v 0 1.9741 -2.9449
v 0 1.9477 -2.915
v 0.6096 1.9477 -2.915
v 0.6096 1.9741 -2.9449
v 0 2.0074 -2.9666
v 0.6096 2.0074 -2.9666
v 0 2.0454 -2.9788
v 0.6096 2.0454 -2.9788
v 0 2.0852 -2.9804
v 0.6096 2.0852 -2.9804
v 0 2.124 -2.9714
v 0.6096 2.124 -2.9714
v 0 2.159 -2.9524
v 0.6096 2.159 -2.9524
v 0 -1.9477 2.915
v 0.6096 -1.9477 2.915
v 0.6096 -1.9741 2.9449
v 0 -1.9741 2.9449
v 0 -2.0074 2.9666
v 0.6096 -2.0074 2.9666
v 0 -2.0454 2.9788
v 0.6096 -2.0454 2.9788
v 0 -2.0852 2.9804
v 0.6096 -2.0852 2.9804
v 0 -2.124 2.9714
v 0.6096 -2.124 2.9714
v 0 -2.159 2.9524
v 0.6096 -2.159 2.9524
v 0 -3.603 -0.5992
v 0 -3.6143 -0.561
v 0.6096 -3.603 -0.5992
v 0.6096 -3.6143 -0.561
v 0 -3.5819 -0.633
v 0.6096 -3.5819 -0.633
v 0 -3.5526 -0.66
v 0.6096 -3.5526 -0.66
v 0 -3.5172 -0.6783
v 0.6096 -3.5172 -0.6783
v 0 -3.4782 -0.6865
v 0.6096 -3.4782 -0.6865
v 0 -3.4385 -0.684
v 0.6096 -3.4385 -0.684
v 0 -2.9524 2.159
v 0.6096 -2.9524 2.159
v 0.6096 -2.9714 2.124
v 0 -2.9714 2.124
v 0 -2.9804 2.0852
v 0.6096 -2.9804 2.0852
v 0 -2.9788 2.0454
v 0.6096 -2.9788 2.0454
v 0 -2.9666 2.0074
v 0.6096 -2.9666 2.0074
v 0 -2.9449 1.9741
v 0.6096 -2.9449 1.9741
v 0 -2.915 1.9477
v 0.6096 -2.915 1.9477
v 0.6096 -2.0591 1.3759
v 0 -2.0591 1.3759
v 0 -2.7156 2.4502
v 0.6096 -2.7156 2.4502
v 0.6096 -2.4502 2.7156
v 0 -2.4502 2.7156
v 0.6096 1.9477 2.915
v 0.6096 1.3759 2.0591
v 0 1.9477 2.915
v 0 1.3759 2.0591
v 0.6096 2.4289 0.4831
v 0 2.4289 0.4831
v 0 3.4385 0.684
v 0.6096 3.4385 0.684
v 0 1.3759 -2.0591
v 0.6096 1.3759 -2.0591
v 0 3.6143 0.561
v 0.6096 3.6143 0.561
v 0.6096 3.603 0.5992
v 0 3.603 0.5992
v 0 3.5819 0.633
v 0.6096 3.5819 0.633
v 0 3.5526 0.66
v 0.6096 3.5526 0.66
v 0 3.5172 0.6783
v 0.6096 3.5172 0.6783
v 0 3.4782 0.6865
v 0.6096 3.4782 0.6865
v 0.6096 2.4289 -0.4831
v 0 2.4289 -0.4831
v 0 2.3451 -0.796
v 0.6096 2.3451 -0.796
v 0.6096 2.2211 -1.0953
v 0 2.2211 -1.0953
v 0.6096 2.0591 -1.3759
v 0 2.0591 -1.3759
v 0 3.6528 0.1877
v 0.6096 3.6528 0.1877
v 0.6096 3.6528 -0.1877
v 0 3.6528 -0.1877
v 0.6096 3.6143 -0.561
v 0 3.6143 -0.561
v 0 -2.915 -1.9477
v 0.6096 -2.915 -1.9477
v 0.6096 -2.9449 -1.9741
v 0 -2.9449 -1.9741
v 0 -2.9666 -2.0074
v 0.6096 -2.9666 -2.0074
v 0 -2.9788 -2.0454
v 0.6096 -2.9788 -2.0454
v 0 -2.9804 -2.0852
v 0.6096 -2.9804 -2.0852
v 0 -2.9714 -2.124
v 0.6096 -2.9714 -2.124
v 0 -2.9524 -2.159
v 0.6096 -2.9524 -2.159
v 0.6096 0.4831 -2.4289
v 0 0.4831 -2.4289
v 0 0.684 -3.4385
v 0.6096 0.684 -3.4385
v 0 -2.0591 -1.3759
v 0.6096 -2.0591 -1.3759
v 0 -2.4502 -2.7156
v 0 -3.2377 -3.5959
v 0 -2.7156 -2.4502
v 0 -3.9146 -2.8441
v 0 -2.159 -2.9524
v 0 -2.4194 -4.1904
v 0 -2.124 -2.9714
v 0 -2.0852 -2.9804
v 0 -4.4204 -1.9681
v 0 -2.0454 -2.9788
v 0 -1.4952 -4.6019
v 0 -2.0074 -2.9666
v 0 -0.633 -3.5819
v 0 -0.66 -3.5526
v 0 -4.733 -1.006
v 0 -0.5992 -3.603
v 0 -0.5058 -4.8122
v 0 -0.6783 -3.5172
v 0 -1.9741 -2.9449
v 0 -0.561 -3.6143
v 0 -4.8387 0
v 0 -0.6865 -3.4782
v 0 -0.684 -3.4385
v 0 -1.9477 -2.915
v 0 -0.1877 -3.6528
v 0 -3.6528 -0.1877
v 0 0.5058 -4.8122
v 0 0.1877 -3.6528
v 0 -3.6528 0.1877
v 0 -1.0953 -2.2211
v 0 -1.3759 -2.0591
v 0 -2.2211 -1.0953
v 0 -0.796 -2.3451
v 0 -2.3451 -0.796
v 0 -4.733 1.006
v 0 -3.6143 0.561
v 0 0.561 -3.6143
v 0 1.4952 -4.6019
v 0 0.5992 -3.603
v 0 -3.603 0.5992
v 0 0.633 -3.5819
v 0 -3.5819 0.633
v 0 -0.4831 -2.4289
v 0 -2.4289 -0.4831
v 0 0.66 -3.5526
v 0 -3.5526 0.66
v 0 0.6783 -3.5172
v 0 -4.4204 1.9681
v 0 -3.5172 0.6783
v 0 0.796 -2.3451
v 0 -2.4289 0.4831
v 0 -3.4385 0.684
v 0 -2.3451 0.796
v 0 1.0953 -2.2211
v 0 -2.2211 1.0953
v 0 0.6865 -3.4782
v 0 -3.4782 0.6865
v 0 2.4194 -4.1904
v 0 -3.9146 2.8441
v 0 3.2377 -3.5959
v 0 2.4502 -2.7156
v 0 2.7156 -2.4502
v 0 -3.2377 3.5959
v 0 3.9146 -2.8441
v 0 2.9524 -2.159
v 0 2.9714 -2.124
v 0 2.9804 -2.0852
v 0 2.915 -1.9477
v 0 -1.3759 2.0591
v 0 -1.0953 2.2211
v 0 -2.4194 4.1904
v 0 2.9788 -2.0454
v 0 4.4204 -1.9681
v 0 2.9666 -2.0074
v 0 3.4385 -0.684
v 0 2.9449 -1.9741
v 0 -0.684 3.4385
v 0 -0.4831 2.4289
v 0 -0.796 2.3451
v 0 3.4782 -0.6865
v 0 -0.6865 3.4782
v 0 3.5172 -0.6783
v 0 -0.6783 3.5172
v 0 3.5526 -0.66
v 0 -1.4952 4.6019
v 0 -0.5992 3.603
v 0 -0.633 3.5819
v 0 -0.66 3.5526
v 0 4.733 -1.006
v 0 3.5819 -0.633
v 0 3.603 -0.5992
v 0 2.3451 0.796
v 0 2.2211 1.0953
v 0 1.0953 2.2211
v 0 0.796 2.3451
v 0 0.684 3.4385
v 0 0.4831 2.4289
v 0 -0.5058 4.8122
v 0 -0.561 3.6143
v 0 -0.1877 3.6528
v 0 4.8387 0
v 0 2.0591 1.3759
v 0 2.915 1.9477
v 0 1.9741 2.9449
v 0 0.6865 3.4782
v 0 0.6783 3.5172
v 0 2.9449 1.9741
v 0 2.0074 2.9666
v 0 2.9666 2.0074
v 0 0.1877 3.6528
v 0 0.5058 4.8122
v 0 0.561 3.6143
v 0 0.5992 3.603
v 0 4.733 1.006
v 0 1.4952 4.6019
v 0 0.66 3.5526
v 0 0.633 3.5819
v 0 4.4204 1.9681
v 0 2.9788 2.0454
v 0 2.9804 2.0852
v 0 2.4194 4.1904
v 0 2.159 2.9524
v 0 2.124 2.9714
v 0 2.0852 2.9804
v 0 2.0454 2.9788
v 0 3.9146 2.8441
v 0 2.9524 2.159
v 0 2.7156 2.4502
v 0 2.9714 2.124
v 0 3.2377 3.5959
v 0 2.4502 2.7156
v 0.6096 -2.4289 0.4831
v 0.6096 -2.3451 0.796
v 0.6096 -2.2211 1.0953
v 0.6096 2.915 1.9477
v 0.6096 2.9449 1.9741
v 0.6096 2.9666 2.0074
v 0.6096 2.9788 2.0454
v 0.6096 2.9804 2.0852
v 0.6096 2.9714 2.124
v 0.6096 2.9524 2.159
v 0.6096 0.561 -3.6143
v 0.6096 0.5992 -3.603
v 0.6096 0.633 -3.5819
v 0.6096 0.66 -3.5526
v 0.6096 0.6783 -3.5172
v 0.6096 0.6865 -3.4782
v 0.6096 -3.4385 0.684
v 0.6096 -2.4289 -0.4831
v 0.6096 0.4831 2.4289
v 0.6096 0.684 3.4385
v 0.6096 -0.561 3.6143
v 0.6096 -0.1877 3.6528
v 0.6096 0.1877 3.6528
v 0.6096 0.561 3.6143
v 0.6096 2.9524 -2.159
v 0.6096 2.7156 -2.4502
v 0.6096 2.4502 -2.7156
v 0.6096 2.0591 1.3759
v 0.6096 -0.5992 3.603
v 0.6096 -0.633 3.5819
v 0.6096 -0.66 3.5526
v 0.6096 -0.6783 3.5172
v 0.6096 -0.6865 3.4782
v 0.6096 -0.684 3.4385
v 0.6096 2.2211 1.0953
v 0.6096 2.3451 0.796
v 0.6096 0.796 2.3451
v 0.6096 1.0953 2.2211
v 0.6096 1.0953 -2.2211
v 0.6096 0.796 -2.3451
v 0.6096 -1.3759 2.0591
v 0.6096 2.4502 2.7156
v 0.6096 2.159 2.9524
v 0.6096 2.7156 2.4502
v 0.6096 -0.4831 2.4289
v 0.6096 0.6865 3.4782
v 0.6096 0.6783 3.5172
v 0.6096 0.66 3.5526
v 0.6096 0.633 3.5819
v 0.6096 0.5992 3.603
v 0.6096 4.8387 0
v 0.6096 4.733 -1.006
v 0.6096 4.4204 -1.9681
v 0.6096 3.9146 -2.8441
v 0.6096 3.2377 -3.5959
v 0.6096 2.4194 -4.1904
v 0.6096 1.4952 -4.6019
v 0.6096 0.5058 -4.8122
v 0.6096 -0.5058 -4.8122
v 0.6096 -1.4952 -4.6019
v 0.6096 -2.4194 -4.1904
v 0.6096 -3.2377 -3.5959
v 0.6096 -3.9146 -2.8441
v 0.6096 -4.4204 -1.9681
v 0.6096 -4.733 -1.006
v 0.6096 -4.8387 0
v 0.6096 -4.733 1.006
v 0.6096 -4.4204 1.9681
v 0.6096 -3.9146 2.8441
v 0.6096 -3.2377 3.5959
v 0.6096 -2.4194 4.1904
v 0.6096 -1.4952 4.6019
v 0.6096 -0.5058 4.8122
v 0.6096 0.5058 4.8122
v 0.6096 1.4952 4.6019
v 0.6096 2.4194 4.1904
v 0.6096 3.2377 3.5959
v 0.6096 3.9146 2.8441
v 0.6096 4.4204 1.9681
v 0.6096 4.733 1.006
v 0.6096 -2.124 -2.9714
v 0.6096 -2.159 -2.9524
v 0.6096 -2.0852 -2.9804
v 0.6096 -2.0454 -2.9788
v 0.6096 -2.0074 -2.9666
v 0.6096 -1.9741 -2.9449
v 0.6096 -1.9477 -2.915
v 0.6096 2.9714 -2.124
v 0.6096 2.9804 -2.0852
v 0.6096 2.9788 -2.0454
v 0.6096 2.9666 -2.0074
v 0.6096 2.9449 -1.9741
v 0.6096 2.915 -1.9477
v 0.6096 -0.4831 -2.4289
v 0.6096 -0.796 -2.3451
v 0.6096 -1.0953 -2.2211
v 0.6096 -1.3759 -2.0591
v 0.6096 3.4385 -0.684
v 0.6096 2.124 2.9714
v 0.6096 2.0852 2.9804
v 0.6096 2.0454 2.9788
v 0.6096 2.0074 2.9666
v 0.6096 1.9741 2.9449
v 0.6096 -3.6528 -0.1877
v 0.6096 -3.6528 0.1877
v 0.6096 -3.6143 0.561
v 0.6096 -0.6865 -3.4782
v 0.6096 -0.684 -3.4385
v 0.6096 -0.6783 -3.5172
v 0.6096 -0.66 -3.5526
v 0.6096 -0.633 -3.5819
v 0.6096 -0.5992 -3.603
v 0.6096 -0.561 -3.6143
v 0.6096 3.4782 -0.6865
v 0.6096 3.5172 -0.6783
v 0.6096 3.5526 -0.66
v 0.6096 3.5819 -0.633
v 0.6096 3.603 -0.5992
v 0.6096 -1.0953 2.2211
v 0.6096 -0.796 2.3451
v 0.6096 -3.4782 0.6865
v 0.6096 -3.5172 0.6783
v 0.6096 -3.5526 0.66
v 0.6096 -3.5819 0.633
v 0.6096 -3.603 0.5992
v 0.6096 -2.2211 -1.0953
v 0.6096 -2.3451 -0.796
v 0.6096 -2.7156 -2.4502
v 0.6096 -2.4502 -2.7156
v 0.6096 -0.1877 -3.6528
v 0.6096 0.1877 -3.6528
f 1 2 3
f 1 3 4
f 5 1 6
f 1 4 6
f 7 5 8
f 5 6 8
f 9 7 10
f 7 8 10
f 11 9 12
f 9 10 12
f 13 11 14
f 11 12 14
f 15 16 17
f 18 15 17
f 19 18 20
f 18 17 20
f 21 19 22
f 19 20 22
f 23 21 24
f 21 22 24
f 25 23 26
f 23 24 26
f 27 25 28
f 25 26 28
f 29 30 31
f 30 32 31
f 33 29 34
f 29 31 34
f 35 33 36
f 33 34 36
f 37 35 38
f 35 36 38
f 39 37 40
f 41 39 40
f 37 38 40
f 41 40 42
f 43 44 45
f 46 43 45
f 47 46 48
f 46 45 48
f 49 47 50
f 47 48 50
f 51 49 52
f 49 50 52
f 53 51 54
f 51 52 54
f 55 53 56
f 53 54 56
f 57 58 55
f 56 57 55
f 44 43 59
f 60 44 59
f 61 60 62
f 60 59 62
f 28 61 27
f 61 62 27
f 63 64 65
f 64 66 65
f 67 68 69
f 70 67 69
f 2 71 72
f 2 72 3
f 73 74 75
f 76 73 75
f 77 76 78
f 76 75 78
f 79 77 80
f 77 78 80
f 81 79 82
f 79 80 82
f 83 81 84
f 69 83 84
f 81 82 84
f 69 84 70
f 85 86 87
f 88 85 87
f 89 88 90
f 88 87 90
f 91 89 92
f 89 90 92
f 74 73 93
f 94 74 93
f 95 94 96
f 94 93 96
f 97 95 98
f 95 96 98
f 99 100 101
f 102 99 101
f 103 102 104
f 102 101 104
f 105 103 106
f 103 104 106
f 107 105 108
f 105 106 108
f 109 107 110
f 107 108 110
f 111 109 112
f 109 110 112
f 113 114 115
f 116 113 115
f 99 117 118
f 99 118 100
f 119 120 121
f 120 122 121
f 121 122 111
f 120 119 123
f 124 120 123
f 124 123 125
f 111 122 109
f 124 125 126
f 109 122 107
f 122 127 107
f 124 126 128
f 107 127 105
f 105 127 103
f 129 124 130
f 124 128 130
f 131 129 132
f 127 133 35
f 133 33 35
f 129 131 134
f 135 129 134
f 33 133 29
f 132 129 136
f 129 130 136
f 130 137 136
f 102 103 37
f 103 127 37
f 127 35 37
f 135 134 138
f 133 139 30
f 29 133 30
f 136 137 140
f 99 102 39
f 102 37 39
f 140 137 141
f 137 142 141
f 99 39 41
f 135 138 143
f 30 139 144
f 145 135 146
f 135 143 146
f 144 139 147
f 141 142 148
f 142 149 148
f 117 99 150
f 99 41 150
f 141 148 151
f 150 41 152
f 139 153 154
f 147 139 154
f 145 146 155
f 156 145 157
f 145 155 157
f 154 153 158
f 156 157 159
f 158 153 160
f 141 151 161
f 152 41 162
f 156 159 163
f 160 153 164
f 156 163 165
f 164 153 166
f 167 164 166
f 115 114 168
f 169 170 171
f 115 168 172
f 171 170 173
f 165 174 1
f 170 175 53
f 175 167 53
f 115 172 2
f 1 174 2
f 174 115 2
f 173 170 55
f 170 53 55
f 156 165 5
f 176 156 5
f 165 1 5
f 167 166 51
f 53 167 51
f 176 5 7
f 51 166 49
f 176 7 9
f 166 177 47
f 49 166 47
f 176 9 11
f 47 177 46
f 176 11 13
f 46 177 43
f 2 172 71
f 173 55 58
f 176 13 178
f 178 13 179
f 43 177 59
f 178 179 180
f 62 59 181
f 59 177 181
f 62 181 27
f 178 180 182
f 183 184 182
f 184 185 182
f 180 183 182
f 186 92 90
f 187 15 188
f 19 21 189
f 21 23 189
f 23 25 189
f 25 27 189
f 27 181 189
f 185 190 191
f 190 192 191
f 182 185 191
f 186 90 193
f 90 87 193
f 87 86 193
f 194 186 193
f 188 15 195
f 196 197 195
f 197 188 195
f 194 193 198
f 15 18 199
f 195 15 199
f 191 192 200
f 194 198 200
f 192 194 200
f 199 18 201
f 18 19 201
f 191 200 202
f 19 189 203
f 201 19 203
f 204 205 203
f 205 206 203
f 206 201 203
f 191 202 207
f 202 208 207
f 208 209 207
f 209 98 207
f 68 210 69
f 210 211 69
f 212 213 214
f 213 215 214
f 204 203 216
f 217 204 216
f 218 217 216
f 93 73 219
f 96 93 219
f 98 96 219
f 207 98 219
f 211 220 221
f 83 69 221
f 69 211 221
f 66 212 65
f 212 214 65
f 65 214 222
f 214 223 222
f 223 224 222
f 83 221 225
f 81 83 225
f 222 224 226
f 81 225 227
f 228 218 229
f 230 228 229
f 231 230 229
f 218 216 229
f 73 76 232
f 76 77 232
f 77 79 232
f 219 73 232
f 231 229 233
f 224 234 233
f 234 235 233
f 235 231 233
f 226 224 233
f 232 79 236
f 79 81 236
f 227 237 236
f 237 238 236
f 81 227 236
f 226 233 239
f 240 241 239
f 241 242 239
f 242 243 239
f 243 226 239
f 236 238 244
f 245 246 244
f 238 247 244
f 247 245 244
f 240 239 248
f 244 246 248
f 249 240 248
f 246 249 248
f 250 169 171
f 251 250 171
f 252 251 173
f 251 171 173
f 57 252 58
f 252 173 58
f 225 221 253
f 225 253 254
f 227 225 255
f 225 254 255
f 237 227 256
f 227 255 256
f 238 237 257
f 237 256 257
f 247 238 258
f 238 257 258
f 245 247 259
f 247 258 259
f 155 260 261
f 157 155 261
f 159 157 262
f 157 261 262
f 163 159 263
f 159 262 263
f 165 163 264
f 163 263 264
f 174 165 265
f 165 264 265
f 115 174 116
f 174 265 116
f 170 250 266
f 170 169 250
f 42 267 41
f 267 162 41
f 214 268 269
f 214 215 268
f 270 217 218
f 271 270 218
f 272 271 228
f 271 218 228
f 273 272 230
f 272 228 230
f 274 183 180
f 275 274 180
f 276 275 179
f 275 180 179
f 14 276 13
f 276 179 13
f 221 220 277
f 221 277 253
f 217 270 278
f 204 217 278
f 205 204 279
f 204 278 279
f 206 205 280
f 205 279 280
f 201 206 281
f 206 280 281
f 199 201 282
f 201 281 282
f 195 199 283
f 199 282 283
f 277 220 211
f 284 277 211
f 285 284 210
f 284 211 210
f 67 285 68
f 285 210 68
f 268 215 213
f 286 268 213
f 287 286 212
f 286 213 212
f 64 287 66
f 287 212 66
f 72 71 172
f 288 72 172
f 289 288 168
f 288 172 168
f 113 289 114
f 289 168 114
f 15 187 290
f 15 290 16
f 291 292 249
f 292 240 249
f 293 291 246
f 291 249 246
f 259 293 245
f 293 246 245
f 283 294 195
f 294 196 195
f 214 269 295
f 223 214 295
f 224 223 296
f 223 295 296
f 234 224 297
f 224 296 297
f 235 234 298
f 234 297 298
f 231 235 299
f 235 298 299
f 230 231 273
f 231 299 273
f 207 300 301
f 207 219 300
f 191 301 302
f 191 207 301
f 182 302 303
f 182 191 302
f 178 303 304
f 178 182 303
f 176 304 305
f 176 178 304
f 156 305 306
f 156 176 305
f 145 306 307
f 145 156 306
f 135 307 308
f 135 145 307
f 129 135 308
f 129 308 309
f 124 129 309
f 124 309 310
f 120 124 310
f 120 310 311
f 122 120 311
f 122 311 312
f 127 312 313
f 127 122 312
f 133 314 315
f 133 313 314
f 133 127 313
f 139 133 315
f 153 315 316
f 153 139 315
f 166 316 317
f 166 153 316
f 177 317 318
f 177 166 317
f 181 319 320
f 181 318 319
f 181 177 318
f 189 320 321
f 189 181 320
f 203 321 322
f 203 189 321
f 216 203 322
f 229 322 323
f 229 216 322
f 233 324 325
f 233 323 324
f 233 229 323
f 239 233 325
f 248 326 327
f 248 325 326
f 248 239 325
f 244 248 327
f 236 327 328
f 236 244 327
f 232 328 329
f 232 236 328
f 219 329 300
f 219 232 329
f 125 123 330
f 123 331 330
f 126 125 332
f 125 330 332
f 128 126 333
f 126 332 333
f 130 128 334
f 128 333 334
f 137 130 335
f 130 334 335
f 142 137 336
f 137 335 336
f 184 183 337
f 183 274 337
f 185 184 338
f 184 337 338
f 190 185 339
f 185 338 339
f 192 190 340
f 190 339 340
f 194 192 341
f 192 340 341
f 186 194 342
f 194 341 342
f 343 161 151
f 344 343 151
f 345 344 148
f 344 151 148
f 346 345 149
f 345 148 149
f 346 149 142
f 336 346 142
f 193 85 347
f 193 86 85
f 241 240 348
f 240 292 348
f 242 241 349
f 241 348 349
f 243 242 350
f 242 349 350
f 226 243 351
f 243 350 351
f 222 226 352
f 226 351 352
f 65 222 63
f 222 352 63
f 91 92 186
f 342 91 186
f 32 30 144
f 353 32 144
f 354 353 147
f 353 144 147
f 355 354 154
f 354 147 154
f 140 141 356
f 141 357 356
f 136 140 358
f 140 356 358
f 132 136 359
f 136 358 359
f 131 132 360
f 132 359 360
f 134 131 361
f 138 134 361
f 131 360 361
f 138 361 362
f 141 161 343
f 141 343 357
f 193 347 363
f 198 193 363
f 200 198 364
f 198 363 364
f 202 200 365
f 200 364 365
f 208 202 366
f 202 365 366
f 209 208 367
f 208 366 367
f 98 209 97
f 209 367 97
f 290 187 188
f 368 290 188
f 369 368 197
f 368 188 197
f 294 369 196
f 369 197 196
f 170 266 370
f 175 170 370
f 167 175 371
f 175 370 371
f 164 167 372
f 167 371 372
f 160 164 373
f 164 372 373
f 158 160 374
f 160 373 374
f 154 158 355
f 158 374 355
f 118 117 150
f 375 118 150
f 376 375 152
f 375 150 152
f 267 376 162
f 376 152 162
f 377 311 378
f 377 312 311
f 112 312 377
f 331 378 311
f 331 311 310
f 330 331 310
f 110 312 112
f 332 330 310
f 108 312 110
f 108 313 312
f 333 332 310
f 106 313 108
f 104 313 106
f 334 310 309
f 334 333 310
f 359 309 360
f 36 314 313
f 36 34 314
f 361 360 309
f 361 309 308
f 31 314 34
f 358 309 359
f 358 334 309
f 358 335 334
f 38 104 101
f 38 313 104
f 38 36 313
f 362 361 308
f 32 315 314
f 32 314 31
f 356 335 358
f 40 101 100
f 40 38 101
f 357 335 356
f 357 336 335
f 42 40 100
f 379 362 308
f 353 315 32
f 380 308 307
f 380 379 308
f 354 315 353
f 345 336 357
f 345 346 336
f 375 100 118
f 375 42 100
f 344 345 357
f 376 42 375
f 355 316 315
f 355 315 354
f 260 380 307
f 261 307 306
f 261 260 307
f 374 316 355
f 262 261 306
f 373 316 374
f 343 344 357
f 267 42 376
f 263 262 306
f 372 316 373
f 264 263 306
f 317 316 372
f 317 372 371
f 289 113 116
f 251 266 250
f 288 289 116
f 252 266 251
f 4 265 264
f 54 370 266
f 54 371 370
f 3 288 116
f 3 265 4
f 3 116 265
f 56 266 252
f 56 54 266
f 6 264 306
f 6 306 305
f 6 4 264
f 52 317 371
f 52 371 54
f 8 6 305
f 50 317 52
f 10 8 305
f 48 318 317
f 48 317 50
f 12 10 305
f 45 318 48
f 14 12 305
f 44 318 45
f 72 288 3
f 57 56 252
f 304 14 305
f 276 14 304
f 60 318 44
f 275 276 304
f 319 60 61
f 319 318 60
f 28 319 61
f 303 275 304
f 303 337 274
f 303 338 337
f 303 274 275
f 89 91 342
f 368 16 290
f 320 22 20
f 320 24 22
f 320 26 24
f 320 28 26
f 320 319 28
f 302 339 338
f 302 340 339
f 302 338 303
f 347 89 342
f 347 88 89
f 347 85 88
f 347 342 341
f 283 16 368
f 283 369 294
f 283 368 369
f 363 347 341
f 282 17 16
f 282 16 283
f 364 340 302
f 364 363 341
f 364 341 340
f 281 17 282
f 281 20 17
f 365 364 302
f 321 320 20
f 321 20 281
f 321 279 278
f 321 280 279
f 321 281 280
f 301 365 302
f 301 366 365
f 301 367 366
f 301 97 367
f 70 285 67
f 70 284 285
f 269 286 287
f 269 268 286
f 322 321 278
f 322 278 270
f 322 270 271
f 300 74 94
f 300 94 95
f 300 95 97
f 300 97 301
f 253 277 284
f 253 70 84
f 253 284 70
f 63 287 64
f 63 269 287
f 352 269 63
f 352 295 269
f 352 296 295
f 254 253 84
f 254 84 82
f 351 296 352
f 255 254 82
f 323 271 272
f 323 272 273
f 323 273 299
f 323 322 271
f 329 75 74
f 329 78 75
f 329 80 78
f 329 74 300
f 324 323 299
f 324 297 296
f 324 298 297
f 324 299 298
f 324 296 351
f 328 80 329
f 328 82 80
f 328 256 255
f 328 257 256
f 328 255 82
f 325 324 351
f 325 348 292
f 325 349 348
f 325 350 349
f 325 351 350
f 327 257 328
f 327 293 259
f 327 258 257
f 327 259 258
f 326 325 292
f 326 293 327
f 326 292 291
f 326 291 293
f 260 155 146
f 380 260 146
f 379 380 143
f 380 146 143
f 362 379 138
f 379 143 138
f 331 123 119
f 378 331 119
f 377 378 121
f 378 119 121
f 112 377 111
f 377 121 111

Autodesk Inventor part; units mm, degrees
ref_plane "YZ Plane" through (0, 0, 0) normal (1, 0, 0) x (0, 1, 0)
ref_plane "XZ Plane" through (0, 0, 0) normal (0, 1, 0) x (-1, 0, 0)
sketch "Sketch1" plane through (0, 0, 0) normal (1, 0, 0) x (0, 1, 0)
  circle A0 centre (0, 0) radius 4.8387
  circle A1 centre (0, 0) radius 2.4765
  dimension "d0" = 9.6774
  dimension "d1" = 4.953
extrude "Body" add sketch "Sketch1" along normal blind 0.6096
sketch "Sketch2" plane through (0, 0, 0) normal (-1, 0, 0) x (0, 0, 1)
  circle A0 centre (0, 0) radius 2.4765 projected
  circle A1 centre (0, 0) radius 4.8387 projected
  arc A2 (0.7136, 3.5873) -> (-0.7136, 3.5873) centre (0, 0) ccw
  line L0 (-0.4831, 2.4289) -> (-0.7136, 3.5873)
  line L1 (0, 0) -> (0, 3.6576) construction
  line L2 (0.4831, 2.4289) -> (0.7136, 3.5873)
  line L3 (-0.4831, 2.4289) -> (0, 0) construction
  line L4 (0.4831, 2.4289) -> (0, 0) construction
  dimension "d4" = 7.3152
  dimension "d5" = 11.25
extrude "Cut" cut sketch "Sketch2" against normal blind 0.6096 contours A0 L0 A2 L2
fillet "Fillet1" radius 0.1486 2 edges at (0.3048, 3.5873, 0.7136) (0.3048, 3.5873, -0.7136)
pattern_circular "Cuts" count 8 over 360 about axis through (-10, 0, 0) along (1, 0, 0) of "Cut", "Fillet1"
ref_plane "Work Plane1" through (0, 0, 0) normal (0, 1, 0) x (1, 0, 0)
equation "\"d0\" = SD2"
equation "\"d1\" = SD1"
equation "\"d2\" = SD"
equation "\"d4\" = 0.5 * SD2 + 0.5 * SD1"
equation "\"d6\" = SD"
equation "\"d8\" = 0.03 * SD1"
equation "\"SD1\" = 4.953"
equation "\"SD2\" = 9.6774"
equation "\"SD\" = 0.6096"
equation "\"NND\" = 4.826"
properties part number "ASME B18.21.1 - No. 10. Carbon Steel" material "Steel, Mild"
